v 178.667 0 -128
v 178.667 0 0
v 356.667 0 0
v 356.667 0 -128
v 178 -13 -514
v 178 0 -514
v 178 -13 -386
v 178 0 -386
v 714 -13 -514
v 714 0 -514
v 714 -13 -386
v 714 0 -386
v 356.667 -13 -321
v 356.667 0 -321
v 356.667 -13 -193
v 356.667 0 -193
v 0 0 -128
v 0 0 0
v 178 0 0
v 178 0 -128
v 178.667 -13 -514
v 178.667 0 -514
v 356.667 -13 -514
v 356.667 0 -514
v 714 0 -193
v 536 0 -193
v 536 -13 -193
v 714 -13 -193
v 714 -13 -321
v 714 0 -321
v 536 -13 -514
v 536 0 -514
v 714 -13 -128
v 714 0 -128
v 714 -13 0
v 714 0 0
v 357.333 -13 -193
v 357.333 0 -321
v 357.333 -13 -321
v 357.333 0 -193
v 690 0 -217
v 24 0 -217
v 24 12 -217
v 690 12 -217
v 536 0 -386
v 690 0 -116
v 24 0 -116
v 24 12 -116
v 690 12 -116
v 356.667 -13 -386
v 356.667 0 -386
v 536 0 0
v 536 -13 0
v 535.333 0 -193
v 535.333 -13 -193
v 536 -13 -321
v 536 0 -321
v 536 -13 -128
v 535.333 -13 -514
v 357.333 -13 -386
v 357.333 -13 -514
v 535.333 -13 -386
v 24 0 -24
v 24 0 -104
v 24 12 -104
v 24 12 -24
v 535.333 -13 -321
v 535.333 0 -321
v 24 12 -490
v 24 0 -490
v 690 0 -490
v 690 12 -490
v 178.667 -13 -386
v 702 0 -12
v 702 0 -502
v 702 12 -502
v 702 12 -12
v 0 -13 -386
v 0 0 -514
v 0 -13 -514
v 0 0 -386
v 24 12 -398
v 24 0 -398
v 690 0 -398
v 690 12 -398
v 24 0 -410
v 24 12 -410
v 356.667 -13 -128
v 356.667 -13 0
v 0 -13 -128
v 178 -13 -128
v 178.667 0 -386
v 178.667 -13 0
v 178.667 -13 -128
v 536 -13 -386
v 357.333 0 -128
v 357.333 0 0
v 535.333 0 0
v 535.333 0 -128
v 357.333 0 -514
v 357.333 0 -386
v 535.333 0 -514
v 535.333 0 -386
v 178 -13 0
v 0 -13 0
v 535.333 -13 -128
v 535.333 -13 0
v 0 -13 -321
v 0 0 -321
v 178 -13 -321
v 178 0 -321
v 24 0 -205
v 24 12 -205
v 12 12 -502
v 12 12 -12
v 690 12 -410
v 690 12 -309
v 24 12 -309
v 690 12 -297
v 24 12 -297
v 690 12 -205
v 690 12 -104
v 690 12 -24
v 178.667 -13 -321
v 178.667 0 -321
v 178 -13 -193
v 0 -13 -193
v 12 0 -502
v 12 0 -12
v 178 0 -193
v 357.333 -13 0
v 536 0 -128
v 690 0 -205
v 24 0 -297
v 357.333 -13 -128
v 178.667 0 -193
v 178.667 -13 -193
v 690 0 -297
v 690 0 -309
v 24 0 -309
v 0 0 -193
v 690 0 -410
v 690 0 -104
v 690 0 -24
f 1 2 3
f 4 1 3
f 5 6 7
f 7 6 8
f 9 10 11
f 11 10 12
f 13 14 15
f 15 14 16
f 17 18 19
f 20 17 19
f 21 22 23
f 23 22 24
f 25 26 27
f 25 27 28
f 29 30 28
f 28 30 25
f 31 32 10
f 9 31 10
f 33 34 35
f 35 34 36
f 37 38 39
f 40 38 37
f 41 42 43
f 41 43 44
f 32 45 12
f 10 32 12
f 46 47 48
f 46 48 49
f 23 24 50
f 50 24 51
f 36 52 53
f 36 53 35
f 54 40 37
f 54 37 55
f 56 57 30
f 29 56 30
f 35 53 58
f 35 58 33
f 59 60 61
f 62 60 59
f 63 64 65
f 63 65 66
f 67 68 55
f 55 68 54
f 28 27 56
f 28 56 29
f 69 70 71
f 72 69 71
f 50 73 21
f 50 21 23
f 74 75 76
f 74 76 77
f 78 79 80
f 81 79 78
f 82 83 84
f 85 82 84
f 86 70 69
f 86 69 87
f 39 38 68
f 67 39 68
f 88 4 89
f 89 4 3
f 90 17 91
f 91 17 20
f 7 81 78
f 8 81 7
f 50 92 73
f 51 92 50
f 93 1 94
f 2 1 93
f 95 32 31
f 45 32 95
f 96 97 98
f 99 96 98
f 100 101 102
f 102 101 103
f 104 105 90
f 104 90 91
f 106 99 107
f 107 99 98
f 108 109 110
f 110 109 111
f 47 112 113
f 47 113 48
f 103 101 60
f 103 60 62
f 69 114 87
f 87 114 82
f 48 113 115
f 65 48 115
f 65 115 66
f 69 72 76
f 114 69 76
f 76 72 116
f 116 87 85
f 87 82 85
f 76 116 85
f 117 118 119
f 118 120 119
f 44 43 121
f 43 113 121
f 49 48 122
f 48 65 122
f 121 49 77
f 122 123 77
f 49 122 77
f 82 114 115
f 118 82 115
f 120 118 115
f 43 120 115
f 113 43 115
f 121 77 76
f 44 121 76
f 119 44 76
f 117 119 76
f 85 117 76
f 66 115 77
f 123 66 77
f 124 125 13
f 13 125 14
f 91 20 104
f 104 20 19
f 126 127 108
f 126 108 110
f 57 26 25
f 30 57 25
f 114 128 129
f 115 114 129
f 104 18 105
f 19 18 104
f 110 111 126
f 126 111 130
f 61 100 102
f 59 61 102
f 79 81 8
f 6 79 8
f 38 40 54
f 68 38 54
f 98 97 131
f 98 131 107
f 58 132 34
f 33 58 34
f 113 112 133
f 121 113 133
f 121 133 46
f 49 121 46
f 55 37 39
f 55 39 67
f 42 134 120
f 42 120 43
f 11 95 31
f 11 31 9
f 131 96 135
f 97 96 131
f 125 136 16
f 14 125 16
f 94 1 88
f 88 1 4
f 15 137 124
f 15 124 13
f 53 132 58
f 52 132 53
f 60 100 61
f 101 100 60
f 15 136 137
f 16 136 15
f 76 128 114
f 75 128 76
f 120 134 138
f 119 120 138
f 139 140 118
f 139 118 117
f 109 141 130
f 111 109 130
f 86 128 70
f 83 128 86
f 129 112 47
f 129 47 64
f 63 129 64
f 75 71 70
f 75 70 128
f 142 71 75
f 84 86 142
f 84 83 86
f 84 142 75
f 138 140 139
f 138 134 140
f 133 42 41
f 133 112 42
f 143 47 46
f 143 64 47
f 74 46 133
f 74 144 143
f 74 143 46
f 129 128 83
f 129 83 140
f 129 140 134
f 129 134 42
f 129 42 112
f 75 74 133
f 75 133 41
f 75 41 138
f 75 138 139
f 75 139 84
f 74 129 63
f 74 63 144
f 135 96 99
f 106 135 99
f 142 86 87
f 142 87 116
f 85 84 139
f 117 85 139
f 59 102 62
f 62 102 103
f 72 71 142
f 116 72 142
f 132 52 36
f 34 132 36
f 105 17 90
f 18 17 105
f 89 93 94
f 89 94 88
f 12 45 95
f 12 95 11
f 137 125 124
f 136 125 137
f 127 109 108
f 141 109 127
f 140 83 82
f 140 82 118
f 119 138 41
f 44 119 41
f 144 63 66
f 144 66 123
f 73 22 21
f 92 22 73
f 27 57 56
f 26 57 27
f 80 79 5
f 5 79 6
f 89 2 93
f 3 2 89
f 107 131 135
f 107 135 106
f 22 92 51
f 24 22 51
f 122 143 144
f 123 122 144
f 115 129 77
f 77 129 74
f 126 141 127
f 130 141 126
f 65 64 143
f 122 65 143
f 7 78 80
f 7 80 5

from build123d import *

# Parameters (mm, degrees)
F0_W     = 690
F0_H     = 490
F0_W_2   = 666
F0_H_2   = 80
F0_H_3   = 89
F1_DEPTH = 12
F2_W     = 178
F2_H     = 128
F3_DEPTH = 13


with BuildPart() as f1:
    # F0 (on Front) → F1 (new body)
    with BuildSketch(Plane.XZ):
        with Locations((357, -257)):
            Rectangle(F0_W, F0_H)
        with Locations((357, -450)):
            Rectangle(F0_W_2, F0_H_2, mode=Mode.SUBTRACT)
        with Locations((357, -353.5)):
            Rectangle(F0_W_2, F0_H_3, mode=Mode.SUBTRACT)
        with Locations((357, -257)):
            Rectangle(F0_W_2, F0_H_2, mode=Mode.SUBTRACT)
        with Locations((357, -160.5)):
            Rectangle(F0_W_2, F0_H_3, mode=Mode.SUBTRACT)
        with Locations((357, -64)):
            Rectangle(F0_W_2, F0_H_2, mode=Mode.SUBTRACT)
    extrude(amount=-F1_DEPTH)


with BuildPart() as f3:
    # F2 (on Front) → F3 (new body)
    with BuildSketch(Plane.XZ):
        with Locations((89, -64)):
            Rectangle(F2_W, F2_H)
        with Locations((267.666667, -64)):
            Rectangle(F2_W, F2_H)
        with Locations((446.333333, -64)):
            Rectangle(F2_W, F2_H)
        with Locations((625, -64)):
            Rectangle(F2_W, F2_H)
        with Locations((89, -257)):
            Rectangle(F2_W, F2_H)
        with Locations((267.666667, -257)):
            Rectangle(F2_W, F2_H)
        with Locations((446.333333, -257)):
            Rectangle(F2_W, F2_H)
        with Locations((625, -257)):
            Rectangle(F2_W, F2_H)
        with Locations((89, -450)):
            Rectangle(F2_W, F2_H)
        with Locations((267.666667, -450)):
            Rectangle(F2_W, F2_H)
        with Locations((446.333333, -450)):
            Rectangle(F2_W, F2_H)
        with Locations((625, -450)):
            Rectangle(F2_W, F2_H)
    extrude(amount=F3_DEPTH)


solid = Compound([f1.part, f3.part])
